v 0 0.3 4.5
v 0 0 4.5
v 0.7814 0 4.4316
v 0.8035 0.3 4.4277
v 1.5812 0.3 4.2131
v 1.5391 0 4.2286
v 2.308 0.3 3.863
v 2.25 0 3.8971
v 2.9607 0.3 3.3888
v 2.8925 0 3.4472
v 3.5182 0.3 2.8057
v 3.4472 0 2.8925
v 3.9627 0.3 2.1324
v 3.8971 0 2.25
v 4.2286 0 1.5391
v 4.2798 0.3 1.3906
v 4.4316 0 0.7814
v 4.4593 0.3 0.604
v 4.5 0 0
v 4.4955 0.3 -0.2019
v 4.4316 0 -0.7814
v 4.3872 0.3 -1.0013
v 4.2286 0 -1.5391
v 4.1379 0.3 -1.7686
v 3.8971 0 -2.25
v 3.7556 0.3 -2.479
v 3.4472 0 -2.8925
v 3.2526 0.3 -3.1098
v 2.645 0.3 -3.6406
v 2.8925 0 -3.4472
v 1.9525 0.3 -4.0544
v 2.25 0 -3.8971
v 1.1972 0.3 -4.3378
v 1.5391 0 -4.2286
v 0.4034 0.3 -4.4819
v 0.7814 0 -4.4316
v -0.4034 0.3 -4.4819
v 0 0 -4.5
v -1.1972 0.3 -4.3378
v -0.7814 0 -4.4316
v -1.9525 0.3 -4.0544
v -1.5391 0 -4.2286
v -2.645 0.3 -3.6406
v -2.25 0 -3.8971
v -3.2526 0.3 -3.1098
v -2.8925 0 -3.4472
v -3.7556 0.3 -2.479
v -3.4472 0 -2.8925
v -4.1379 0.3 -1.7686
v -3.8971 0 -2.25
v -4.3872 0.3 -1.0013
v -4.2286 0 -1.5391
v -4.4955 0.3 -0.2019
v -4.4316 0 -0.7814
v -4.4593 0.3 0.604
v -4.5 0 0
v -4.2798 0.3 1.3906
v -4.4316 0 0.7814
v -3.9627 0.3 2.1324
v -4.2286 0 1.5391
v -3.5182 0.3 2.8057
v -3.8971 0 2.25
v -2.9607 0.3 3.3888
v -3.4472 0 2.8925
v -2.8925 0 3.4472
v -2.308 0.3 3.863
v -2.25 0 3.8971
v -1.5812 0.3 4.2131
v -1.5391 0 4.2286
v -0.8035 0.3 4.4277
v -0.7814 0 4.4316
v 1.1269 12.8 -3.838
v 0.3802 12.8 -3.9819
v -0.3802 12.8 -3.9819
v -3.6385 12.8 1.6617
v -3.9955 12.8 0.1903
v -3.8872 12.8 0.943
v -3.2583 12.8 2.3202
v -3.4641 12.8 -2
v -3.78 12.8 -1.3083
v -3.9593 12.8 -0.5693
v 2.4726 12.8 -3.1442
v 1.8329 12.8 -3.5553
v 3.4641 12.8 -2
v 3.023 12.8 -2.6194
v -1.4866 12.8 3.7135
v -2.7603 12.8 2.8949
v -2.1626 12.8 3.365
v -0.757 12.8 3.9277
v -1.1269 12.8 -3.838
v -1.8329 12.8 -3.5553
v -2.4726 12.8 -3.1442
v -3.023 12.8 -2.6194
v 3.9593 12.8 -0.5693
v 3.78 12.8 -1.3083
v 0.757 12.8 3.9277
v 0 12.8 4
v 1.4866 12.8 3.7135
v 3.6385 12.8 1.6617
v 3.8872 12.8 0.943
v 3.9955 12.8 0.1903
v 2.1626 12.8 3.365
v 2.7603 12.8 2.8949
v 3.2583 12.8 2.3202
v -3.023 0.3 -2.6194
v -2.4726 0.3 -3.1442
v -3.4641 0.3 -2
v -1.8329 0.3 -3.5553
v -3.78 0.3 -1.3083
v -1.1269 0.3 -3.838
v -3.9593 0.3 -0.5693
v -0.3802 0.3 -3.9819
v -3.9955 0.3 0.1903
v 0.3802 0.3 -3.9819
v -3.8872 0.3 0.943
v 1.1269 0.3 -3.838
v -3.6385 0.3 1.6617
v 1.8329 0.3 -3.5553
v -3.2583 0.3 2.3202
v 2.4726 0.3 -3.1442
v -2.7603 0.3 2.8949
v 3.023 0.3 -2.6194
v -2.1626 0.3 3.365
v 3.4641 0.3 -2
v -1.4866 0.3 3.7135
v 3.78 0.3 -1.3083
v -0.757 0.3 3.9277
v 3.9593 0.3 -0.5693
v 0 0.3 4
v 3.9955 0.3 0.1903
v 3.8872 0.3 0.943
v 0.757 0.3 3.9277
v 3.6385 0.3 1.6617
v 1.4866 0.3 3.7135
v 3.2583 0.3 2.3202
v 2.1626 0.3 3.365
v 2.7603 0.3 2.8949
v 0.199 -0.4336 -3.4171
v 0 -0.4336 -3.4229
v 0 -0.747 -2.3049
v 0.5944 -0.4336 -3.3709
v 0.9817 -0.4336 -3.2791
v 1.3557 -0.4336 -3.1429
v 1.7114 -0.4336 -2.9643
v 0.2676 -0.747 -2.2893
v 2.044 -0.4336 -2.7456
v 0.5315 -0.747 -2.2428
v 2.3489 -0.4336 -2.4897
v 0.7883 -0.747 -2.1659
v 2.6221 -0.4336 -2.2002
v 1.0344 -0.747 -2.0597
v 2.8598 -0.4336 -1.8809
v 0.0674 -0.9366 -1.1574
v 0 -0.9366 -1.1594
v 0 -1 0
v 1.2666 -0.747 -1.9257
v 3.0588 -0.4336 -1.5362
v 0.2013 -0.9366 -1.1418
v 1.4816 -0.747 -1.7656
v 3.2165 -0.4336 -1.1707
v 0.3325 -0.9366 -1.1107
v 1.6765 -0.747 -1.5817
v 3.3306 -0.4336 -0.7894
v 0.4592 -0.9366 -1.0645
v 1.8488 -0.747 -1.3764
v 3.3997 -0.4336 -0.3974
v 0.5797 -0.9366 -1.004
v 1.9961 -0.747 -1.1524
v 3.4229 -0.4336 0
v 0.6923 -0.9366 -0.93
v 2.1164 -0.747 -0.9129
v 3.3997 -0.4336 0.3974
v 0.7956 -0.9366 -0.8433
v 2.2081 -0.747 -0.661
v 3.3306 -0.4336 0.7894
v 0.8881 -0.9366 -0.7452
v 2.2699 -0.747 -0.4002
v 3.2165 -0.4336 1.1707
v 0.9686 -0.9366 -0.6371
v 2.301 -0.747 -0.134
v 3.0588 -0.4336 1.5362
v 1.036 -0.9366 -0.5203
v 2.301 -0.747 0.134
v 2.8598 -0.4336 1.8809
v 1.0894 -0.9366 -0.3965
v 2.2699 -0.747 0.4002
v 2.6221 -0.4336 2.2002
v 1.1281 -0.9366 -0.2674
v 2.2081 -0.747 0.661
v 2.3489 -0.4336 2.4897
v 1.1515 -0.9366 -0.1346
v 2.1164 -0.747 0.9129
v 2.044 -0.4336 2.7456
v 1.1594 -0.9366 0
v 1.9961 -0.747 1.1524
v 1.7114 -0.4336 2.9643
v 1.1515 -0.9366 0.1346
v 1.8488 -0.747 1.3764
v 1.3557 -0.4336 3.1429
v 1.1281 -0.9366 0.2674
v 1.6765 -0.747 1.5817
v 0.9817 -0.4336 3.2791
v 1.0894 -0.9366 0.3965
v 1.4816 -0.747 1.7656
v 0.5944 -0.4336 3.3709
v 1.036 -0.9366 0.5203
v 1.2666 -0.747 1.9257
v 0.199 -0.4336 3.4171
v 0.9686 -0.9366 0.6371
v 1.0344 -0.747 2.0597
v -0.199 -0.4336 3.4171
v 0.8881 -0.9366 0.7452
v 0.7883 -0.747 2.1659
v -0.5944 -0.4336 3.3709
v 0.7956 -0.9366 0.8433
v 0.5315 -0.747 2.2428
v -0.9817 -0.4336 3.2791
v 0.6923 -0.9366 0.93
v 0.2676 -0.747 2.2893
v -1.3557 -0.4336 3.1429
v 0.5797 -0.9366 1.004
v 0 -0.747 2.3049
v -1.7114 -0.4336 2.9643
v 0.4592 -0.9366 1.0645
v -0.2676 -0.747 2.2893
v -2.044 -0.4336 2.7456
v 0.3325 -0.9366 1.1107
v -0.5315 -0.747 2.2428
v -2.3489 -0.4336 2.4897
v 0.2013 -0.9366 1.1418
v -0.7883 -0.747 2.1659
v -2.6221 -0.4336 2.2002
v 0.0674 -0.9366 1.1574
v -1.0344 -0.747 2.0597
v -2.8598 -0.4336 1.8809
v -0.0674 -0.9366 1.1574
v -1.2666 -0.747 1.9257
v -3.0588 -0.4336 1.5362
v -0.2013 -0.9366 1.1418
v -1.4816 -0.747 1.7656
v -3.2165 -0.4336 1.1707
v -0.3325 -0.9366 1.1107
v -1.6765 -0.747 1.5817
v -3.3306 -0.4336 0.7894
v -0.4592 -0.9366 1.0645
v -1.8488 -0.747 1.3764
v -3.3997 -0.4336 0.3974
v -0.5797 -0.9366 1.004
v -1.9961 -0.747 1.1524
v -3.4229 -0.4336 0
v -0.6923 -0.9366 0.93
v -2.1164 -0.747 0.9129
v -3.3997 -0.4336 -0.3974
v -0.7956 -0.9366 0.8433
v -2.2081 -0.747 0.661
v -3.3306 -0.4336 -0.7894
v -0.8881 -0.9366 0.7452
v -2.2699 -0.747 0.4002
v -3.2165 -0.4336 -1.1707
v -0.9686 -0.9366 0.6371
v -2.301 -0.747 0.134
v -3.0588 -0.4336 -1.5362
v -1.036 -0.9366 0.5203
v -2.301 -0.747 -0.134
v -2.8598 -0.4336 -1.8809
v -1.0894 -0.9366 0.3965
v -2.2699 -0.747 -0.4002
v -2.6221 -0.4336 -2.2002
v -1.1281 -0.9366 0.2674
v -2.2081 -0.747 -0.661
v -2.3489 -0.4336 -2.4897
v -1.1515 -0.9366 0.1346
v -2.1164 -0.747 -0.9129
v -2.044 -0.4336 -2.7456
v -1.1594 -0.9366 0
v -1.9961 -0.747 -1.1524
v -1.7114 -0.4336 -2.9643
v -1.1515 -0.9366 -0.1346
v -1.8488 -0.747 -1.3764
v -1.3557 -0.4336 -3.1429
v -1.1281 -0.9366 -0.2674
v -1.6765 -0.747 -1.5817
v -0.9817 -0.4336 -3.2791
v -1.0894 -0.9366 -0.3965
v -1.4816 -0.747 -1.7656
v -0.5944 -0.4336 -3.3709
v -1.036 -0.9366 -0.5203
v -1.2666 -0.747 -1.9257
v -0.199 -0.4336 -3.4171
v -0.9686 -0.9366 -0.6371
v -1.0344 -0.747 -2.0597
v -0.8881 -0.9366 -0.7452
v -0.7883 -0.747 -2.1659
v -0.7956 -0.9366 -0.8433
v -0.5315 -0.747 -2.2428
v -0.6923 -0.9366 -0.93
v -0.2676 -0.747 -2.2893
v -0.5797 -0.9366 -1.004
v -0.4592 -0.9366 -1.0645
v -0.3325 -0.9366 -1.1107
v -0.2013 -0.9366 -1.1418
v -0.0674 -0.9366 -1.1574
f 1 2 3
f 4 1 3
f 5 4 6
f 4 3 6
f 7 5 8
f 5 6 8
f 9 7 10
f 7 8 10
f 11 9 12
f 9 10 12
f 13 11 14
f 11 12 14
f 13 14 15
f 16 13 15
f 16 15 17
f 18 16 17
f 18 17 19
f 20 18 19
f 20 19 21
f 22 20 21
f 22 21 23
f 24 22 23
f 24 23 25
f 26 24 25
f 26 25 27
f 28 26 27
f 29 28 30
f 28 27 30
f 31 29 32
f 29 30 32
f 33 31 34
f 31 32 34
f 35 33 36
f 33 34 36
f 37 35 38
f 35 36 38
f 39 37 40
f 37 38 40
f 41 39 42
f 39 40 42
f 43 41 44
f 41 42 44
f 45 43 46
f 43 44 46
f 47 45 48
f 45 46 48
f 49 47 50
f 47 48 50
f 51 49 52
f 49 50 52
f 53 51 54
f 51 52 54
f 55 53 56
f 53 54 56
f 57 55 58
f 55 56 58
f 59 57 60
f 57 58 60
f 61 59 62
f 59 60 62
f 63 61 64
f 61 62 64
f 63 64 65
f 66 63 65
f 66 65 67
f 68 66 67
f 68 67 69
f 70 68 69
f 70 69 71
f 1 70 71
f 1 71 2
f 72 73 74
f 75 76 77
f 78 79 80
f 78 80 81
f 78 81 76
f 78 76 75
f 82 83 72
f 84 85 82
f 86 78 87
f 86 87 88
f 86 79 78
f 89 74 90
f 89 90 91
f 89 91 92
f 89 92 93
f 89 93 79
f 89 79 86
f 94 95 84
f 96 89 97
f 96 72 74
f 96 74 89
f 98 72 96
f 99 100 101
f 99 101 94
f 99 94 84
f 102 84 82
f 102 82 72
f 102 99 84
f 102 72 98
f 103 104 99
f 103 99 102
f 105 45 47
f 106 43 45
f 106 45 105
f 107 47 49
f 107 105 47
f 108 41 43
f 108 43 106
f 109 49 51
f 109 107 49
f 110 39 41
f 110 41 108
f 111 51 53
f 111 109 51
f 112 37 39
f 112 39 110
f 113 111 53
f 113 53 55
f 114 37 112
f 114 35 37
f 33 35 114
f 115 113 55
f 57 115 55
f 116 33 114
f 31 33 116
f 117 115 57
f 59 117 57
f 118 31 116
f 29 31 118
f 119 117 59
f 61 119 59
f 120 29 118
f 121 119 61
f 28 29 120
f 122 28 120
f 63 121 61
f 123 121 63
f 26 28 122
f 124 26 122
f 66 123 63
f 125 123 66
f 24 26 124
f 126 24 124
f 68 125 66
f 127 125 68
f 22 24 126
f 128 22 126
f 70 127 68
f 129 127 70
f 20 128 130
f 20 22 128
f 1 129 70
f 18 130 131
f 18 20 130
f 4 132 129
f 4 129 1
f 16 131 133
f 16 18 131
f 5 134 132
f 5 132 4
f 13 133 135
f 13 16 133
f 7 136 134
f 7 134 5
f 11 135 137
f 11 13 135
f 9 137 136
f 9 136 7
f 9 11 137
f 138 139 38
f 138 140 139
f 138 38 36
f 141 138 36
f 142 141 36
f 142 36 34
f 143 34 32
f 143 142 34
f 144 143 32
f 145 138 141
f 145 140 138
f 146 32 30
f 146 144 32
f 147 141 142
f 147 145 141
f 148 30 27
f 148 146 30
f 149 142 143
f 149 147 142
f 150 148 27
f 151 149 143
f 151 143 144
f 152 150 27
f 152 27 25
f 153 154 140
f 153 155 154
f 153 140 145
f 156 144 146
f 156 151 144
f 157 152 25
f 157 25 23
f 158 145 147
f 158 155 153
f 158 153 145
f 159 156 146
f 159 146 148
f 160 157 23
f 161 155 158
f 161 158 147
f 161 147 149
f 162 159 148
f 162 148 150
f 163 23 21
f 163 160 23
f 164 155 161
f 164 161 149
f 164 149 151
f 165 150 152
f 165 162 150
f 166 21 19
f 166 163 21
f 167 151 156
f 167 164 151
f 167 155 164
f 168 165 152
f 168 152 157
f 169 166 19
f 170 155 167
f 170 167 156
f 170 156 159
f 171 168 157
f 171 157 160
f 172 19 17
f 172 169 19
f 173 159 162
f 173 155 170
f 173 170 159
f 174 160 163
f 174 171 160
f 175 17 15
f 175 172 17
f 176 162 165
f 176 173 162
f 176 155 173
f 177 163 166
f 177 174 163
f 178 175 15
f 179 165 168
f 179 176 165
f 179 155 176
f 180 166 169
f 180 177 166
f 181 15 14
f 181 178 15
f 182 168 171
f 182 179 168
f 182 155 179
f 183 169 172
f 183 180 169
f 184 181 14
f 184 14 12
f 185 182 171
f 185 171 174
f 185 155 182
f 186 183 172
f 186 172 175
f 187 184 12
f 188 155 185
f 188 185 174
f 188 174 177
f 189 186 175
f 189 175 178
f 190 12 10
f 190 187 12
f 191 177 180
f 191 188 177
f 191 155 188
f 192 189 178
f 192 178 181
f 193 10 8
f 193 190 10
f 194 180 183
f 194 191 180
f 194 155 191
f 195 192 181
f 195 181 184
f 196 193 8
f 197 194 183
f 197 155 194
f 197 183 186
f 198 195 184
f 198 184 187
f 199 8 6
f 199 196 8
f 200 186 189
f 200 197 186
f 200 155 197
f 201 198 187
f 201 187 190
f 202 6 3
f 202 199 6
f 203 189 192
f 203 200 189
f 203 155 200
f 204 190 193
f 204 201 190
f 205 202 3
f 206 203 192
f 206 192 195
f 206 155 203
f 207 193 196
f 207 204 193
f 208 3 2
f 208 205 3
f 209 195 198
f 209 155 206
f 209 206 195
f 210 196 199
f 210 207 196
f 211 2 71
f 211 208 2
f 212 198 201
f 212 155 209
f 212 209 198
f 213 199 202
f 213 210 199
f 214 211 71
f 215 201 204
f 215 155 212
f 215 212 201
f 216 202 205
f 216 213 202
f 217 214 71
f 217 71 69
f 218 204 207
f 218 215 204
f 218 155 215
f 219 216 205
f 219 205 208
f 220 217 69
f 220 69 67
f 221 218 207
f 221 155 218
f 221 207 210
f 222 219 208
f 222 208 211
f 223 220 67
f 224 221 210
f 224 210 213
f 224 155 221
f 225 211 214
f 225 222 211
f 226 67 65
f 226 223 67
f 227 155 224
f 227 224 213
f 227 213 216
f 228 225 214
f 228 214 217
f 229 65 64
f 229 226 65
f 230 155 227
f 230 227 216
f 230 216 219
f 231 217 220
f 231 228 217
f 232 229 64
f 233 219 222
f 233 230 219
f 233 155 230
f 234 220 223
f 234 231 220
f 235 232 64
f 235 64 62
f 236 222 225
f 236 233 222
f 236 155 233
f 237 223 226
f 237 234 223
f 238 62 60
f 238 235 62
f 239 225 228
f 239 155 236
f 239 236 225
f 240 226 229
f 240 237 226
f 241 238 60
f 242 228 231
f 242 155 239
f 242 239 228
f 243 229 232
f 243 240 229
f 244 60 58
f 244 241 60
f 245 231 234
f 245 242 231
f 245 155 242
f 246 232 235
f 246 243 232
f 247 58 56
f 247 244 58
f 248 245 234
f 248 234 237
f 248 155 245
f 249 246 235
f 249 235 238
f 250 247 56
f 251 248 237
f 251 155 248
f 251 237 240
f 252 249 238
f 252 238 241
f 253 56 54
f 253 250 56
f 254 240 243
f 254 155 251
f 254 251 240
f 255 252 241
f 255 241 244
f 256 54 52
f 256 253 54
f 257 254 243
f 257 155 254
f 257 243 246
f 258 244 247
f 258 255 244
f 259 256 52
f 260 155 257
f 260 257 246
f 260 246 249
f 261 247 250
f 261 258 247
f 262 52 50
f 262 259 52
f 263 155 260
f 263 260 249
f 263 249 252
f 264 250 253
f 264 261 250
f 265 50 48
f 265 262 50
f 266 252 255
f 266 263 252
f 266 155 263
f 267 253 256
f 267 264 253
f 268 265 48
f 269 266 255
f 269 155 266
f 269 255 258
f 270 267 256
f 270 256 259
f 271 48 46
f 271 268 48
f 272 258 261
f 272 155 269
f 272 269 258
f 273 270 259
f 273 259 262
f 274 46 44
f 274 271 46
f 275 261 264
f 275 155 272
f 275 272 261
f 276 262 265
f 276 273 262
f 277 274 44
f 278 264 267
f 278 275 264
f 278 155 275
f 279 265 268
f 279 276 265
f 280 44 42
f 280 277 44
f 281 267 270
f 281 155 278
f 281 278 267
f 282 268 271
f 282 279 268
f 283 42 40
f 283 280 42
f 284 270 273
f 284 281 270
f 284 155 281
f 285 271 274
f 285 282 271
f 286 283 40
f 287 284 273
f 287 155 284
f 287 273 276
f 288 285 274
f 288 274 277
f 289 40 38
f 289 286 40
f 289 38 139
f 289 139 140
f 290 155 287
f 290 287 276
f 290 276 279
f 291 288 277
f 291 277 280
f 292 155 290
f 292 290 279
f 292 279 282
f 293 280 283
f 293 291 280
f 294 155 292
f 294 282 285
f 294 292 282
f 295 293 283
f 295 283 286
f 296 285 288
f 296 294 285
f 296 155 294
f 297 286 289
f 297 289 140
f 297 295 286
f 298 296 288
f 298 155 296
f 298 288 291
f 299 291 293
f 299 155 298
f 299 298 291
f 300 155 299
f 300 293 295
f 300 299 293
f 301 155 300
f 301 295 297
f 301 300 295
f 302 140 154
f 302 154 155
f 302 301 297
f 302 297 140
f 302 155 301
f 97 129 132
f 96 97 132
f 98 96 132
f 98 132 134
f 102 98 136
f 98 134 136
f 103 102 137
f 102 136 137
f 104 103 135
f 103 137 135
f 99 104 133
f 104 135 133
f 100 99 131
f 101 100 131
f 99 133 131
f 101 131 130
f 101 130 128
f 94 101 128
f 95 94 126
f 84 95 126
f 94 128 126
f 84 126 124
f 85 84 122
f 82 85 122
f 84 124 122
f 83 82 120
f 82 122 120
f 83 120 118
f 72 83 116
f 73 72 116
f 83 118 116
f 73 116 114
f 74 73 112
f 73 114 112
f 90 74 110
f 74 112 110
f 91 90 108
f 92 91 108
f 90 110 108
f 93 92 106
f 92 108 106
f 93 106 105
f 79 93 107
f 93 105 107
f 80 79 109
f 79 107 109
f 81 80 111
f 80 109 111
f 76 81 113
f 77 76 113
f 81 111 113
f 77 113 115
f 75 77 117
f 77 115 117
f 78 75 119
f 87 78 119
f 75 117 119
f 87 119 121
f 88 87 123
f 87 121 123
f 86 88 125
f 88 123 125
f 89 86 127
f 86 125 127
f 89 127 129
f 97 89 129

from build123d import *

# Parameters (mm, degrees)
SKETCH1_R           = 4.5
BOSS_EXTRUDE1_DEPTH = 0.3
DOME1_FACE_RADIUS   = 4.5
DOME1_HEIGHT        = 1
SKETCH2_R           = 4
BOSS_EXTRUDE2_DEPTH = 12.5


with BuildPart() as part:
    # Sketch1 → Boss-Extrude1 (new body)
    with BuildSketch(Plane(origin=(0, 0, 0), x_dir=(1, 0, 0), z_dir=(0, 1, 0))):
        with Locations(Location((0, 0, 0), (0, 0, 270))):
            Circle(SKETCH1_R)
    extrude(amount=BOSS_EXTRUDE1_DEPTH)

    # Dome1: a dome of height H over a round flat face of radius A is a cap of a sphere of radius (A * A + H * H) / (2 * H)
    dome1_r = (DOME1_FACE_RADIUS * DOME1_FACE_RADIUS + DOME1_HEIGHT * DOME1_HEIGHT) / (2 * DOME1_HEIGHT)
    dome1_base = Plane((0, 0, 0), z_dir=(0, -1, 0))
    with Locations(dome1_base.offset(DOME1_HEIGHT - dome1_r)):
        dome1_ball = Sphere(dome1_r, mode=Mode.PRIVATE)
    add(split(dome1_ball, bisect_by=dome1_base, keep=Keep.TOP, mode=Mode.PRIVATE))

    # Sketch2 → Boss-Extrude2 (add)
    with BuildSketch(Plane(origin=(0, 0.3, 0), x_dir=(1, 0, 0), z_dir=(0, 1, 0))):
        with Locations(Location((0, 0, 0), (0, 0, 270))):
            Circle(SKETCH2_R)
    extrude(amount=BOSS_EXTRUDE2_DEPTH)


solid = part.part
